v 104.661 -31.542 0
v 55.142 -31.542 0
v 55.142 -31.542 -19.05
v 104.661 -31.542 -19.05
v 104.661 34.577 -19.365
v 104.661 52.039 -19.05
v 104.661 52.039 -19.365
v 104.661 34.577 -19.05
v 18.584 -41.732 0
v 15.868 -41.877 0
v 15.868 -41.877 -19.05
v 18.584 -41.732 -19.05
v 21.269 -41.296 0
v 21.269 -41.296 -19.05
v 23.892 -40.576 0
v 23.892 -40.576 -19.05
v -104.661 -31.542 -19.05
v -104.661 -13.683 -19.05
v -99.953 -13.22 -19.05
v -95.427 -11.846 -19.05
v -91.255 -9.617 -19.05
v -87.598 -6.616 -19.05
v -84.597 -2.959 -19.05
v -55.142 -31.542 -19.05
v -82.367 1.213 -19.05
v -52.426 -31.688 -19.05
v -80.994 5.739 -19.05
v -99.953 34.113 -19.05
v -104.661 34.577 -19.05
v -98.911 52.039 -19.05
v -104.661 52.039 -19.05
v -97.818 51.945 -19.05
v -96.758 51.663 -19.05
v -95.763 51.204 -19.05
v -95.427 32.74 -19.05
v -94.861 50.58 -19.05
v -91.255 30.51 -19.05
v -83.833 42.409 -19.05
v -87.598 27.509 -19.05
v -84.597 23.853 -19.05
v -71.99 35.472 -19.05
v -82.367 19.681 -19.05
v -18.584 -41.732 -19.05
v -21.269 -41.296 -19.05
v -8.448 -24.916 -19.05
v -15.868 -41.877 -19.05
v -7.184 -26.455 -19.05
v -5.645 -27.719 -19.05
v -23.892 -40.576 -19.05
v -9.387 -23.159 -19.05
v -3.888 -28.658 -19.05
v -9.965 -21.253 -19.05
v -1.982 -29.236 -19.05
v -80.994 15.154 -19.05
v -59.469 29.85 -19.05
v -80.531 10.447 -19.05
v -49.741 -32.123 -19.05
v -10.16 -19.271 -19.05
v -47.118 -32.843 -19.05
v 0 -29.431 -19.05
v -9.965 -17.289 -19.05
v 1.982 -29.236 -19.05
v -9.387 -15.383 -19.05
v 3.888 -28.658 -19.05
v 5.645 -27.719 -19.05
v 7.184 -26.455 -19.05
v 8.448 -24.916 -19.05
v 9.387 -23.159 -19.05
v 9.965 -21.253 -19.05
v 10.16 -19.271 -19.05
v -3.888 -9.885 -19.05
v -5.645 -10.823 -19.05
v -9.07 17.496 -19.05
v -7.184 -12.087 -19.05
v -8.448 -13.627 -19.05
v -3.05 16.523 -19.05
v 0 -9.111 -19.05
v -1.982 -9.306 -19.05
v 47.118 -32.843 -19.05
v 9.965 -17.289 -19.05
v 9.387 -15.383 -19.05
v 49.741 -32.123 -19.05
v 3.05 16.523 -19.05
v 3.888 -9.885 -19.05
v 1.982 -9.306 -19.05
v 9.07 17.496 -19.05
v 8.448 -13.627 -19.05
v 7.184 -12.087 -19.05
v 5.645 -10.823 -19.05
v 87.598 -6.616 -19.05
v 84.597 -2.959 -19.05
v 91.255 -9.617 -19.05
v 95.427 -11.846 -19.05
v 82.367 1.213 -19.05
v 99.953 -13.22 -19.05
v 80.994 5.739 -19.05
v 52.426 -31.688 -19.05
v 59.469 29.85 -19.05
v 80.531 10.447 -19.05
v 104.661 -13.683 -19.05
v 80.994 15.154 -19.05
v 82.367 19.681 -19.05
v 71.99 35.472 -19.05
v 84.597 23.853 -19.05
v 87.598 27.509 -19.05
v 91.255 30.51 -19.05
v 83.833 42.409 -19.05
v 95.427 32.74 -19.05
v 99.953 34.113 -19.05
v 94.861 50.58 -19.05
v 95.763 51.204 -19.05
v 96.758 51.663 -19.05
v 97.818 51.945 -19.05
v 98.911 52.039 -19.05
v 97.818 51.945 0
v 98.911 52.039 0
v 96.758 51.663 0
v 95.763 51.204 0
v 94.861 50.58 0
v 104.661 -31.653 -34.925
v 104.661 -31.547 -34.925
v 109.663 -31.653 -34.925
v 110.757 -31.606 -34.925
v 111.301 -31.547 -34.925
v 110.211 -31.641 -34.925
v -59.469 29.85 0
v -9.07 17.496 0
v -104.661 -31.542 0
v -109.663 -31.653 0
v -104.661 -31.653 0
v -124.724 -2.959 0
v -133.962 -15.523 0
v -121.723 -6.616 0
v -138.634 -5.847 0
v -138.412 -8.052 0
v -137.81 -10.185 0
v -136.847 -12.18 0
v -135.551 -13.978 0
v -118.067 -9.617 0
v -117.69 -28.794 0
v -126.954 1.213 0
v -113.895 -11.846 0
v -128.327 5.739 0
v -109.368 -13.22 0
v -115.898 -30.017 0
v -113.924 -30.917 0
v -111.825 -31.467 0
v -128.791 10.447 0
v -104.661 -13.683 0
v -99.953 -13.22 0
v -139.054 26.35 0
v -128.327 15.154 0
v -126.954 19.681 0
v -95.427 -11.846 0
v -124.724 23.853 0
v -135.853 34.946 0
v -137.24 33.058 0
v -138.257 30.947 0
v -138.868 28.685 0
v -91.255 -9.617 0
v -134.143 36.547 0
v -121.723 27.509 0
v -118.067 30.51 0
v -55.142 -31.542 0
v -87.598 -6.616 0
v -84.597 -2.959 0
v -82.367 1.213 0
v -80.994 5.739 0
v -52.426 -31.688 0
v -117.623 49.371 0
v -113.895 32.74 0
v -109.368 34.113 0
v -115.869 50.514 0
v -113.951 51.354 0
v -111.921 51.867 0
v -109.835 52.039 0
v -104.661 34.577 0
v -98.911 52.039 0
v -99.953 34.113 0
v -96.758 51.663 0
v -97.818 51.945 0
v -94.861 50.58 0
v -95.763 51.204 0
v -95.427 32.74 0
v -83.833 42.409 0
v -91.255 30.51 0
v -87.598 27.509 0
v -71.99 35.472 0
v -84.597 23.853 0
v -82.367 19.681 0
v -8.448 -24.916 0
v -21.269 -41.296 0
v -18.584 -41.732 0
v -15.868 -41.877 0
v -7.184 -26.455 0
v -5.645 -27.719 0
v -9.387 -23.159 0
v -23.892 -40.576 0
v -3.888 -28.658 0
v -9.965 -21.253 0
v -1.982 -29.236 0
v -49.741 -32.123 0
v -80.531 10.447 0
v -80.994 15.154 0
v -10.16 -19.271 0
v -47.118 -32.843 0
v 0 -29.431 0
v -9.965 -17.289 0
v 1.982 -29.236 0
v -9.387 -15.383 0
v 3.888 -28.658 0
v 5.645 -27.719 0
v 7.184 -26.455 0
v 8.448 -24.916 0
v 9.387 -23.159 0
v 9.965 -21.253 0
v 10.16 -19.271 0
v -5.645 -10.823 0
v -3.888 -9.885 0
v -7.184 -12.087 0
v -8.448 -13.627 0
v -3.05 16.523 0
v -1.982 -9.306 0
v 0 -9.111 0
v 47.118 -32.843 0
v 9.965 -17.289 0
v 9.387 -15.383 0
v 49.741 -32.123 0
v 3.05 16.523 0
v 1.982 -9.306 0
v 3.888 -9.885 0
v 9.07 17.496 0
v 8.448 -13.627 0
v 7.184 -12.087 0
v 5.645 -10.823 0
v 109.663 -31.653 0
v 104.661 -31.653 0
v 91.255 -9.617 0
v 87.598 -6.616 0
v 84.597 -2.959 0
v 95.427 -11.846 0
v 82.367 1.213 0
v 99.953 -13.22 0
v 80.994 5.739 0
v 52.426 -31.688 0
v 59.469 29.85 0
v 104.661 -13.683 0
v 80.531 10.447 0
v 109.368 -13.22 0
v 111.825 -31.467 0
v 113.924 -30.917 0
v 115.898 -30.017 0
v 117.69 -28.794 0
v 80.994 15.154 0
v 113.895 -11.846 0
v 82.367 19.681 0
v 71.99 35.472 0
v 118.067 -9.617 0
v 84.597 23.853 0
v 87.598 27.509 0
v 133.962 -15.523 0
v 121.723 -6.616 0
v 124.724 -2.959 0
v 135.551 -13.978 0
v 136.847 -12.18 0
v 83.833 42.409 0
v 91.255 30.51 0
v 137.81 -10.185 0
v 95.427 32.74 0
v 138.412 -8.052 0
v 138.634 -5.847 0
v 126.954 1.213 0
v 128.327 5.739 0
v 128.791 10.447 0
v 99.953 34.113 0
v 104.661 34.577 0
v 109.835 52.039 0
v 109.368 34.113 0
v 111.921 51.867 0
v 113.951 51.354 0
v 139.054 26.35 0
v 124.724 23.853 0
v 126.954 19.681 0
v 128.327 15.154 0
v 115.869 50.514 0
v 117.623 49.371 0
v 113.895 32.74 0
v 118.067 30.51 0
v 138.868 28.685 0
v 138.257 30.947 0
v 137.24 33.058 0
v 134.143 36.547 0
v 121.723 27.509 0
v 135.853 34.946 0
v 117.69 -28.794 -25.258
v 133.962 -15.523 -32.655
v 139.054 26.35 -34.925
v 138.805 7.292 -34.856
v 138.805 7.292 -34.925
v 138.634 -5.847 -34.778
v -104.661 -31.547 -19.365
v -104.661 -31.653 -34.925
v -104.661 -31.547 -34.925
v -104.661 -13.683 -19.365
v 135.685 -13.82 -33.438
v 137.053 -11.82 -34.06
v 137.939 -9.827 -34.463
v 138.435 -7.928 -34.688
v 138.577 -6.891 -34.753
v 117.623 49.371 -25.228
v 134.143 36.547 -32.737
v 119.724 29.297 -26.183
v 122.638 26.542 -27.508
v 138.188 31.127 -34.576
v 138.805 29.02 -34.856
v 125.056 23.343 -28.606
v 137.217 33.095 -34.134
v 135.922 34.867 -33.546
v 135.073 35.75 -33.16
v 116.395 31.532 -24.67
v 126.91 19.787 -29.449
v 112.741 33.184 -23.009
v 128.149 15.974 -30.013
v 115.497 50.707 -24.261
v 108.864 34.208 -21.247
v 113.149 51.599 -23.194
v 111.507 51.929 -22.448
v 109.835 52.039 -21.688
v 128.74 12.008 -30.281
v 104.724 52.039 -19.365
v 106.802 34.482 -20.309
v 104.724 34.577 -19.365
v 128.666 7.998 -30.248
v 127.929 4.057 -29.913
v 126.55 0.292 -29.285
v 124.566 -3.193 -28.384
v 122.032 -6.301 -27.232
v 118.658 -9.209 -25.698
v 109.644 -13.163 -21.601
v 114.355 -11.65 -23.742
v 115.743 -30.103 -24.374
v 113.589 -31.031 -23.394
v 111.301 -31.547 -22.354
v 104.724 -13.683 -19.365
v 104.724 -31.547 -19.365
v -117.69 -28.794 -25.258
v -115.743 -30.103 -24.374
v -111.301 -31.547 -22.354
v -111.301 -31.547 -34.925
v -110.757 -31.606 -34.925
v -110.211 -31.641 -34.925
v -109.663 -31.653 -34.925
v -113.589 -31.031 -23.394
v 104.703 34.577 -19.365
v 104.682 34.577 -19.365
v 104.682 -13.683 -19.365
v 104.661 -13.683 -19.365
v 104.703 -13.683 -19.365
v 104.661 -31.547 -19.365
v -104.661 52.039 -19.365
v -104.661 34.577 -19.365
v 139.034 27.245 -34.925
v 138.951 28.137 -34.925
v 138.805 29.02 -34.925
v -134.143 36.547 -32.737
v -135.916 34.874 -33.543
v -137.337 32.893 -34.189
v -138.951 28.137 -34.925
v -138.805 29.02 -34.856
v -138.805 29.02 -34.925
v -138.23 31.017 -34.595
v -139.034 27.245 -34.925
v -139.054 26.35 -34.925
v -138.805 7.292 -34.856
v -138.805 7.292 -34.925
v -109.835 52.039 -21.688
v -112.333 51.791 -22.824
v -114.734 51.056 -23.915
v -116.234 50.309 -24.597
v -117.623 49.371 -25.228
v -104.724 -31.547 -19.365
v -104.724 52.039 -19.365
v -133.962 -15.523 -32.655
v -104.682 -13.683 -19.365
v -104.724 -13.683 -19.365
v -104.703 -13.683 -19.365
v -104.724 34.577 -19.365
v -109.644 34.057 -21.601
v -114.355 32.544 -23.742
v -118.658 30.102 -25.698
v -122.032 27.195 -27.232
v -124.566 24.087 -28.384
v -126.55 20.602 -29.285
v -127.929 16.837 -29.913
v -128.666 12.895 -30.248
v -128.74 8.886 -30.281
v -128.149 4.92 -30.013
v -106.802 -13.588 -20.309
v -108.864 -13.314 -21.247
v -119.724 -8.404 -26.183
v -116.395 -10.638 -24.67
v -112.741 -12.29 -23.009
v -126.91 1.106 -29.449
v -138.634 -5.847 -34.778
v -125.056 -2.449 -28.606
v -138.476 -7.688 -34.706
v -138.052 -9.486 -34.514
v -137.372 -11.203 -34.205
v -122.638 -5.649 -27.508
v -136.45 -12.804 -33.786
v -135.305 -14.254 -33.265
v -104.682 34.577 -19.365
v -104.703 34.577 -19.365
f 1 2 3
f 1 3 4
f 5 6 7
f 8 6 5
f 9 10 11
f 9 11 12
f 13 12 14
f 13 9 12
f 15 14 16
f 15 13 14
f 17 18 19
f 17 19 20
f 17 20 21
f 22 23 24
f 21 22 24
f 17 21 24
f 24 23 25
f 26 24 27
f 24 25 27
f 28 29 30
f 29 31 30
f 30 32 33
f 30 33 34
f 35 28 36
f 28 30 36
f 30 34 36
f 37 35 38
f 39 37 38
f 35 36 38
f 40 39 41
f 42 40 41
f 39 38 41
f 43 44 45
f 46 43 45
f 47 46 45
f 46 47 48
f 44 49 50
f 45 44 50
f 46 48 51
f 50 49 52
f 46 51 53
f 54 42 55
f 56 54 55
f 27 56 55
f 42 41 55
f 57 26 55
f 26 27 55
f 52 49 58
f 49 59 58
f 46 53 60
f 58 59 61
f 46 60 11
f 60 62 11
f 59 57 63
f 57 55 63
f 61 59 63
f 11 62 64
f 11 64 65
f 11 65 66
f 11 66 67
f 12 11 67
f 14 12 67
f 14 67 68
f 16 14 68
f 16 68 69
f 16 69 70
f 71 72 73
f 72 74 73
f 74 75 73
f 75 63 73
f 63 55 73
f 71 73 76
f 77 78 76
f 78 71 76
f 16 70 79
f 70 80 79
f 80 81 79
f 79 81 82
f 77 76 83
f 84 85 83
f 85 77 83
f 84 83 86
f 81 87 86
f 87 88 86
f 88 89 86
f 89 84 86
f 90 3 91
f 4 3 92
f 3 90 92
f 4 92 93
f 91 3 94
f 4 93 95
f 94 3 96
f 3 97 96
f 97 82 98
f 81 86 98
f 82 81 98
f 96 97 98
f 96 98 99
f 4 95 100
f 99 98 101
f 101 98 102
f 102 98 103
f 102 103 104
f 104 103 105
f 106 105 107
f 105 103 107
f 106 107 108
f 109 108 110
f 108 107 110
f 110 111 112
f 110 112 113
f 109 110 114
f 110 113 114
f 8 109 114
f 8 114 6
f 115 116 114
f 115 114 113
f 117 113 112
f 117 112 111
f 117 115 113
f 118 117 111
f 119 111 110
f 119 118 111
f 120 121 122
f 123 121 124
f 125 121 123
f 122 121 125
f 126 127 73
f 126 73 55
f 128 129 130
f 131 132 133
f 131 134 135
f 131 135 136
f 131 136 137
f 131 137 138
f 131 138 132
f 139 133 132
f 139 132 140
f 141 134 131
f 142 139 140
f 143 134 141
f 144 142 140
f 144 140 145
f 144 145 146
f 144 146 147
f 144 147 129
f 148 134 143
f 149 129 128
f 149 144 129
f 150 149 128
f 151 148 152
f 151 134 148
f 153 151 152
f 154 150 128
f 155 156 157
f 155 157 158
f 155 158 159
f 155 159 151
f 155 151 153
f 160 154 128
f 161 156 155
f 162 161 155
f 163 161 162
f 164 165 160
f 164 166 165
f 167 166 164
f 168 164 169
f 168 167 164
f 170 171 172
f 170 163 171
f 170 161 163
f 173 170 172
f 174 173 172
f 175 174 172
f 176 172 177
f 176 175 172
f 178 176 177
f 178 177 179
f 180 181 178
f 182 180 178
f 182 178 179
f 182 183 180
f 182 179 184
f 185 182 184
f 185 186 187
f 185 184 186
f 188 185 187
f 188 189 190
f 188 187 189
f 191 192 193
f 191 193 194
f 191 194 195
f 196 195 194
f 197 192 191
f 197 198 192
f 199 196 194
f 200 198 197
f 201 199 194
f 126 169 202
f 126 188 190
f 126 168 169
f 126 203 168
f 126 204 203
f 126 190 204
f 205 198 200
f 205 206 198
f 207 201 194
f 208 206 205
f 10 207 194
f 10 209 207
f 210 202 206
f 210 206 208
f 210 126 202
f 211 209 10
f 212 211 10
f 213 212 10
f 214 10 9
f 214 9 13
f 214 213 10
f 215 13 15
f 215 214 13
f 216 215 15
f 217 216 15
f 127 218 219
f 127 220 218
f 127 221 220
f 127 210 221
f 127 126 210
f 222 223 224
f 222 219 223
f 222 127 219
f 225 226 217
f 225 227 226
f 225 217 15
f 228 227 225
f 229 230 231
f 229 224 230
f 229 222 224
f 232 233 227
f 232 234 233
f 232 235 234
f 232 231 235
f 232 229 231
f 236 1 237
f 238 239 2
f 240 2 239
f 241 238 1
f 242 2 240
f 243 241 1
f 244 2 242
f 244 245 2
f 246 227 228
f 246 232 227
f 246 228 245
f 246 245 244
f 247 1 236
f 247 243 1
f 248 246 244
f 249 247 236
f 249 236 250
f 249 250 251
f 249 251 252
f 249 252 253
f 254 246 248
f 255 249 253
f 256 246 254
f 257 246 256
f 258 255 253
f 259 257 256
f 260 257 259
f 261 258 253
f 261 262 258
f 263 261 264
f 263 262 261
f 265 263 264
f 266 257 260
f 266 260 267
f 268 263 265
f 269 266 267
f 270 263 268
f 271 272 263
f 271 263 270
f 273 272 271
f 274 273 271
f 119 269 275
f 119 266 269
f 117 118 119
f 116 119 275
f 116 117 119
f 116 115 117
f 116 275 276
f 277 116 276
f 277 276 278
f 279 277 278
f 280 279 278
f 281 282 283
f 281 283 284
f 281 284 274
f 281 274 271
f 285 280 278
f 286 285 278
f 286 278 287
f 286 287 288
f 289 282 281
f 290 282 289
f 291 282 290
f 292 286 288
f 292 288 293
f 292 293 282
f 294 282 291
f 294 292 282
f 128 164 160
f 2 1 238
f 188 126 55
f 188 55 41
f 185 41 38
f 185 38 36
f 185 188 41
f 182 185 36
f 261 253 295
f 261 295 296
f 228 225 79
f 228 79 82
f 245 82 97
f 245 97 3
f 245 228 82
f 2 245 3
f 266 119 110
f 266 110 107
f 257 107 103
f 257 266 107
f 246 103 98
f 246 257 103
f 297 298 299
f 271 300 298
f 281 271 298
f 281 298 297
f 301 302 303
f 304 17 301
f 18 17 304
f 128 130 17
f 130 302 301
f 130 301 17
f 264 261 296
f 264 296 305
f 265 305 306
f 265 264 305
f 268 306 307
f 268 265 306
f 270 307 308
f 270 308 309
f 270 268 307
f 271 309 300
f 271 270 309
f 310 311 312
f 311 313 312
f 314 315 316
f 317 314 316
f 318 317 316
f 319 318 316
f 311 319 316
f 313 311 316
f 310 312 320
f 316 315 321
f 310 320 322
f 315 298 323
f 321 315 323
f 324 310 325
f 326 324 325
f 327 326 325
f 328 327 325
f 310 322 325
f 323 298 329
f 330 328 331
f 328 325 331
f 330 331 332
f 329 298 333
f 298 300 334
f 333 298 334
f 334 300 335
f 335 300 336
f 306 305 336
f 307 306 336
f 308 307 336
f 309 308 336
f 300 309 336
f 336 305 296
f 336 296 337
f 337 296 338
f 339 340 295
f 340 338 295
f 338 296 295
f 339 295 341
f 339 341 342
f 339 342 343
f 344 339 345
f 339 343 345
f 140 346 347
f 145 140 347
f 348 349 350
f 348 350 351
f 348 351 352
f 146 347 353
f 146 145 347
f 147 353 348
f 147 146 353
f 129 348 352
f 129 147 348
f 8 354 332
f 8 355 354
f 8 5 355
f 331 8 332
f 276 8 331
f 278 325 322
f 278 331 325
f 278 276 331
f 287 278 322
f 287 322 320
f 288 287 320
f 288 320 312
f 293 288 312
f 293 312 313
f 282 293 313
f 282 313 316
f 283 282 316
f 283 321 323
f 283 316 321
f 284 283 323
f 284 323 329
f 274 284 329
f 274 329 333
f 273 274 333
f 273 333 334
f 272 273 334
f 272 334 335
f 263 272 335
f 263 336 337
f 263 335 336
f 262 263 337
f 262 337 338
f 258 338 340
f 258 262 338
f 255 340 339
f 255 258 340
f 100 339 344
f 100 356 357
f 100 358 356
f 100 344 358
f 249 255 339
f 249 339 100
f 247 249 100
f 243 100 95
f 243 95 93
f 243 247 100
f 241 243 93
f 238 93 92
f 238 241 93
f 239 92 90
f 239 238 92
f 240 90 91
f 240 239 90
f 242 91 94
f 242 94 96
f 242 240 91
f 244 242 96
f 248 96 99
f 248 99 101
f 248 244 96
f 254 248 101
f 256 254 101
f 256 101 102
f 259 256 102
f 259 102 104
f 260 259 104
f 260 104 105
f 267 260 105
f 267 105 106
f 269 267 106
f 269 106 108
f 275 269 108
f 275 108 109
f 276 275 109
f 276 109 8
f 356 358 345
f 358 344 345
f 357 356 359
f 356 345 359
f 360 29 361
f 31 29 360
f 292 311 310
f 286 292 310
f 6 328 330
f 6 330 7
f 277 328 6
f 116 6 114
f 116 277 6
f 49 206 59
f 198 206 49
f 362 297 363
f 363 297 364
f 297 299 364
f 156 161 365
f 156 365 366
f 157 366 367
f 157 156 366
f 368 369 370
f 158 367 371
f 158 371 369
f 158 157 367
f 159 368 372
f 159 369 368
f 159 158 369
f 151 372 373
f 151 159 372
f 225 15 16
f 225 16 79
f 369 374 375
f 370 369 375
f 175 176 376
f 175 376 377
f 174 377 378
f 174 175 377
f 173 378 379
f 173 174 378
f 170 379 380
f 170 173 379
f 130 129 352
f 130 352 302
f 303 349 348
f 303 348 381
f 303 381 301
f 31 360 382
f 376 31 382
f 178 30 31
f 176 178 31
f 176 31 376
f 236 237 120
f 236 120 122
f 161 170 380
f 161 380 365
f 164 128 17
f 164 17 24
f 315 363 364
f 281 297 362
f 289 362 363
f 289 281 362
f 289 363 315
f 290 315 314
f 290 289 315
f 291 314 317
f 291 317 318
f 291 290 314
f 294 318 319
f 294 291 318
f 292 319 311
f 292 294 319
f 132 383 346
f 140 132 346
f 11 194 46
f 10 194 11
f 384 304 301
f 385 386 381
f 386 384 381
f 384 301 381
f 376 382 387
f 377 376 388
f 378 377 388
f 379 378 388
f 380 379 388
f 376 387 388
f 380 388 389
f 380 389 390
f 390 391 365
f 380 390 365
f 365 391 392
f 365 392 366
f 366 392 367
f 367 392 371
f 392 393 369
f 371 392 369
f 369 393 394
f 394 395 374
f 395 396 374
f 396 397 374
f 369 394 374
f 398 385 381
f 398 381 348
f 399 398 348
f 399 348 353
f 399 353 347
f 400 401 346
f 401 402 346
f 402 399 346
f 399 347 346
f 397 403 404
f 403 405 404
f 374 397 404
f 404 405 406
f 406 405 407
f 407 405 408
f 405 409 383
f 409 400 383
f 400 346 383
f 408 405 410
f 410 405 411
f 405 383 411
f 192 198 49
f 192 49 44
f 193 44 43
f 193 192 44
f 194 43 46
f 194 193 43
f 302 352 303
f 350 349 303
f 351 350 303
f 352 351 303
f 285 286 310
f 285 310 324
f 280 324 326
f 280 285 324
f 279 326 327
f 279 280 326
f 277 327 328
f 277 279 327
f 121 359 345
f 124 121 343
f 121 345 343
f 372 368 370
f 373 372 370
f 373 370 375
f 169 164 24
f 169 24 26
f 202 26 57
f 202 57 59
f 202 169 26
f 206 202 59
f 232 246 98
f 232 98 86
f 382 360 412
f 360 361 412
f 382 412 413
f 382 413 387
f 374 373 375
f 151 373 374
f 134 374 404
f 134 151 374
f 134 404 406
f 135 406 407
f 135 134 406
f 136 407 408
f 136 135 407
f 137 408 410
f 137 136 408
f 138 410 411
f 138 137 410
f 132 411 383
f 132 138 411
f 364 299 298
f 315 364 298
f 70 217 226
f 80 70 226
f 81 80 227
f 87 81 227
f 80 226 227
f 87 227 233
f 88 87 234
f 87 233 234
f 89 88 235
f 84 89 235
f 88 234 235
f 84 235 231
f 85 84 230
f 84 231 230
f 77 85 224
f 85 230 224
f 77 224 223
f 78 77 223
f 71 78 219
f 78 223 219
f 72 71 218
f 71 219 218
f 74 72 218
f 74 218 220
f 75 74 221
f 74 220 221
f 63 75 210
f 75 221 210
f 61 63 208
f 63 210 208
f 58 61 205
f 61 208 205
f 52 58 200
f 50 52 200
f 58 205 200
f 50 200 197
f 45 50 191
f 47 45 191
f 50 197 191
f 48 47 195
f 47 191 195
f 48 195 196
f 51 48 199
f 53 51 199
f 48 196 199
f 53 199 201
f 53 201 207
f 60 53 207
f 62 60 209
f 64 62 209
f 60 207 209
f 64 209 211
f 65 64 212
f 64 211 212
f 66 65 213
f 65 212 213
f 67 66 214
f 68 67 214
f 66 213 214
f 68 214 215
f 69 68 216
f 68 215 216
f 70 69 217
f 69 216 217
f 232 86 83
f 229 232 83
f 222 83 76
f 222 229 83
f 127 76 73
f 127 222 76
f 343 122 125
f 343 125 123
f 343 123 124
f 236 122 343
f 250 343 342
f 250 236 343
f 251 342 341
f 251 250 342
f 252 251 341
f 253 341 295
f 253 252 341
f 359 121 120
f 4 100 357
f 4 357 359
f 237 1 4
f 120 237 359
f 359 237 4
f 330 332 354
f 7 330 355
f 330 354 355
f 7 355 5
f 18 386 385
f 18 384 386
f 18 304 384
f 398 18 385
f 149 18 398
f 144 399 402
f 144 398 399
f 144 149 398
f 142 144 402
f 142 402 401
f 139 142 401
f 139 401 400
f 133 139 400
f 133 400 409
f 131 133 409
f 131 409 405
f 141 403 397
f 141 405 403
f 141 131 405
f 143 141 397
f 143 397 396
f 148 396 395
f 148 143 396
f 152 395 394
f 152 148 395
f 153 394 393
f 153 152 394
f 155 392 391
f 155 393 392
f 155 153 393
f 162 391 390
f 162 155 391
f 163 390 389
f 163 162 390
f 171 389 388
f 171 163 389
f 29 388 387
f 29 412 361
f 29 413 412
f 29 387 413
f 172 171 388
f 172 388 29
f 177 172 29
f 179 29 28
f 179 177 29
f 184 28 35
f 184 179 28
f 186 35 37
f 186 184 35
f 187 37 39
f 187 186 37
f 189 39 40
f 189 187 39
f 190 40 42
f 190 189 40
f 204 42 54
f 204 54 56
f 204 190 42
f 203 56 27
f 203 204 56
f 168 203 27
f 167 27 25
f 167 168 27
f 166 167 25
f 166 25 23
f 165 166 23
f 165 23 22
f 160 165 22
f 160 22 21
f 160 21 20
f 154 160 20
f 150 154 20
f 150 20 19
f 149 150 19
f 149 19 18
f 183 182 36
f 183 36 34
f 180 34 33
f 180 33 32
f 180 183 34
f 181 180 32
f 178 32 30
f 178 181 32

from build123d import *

# Parameters (mm, degrees)
F0_R     = 10.16
F2_DEPTH = 19.05
F3_DEPTH = 34.925
F6_DEPTH = 101.6
F7_DEPTH = 101.6


with BuildPart() as f2:
    # F0 (on Top) → F2 (new body)
    with BuildSketch(Plane.XY):
        with BuildLine():
            ThreePointArc((-104.6607, 34.576826), (-80.5307, 10.446826), (-104.6607, -13.683174))
            Line((-104.6607, -13.683174), (-104.6607, -20.42969))
            Line((-104.6607, -20.42969), (-104.6607, -31.54219))
            Line((-104.6607, -31.54219), (-55.142368, -31.54219))
            ThreePointArc((-55.142368, -31.54219), (-51.077865, -31.8695), (-47.118115, -32.842992))
            Line((-47.118115, -32.842992), (-23.892494, -40.576372))
            ThreePointArc((-23.892494, -40.576372), (-19.932744, -41.549864), (-15.868241, -41.877174))
            Line((-15.868241, -41.877174), (15.868241, -41.877174))
            ThreePointArc((15.868241, -41.877174), (19.932744, -41.549864), (23.892494, -40.576372))
            Line((23.892494, -40.576372), (47.118115, -32.842992))
            ThreePointArc((47.118115, -32.842992), (51.077865, -31.8695), (55.142368, -31.54219))
            Line((55.142368, -31.54219), (104.6607, -31.54219))
            Line((104.6607, -31.54219), (104.6607, -20.42969))
            Line((104.6607, -20.42969), (104.6607, -13.683174))
            ThreePointArc((104.6607, -13.683174), (80.5307, 10.446826), (104.6607, 34.576826))
            Line((104.6607, 34.576826), (104.6607, 40.926826))
            Line((104.6607, 40.926826), (104.6607, 52.039326))
            Line((104.6607, 52.039326), (98.910701, 52.039326))
            ThreePointArc((98.910701, 52.039326), (96.758253, 51.663393), (94.860664, 50.580103))
            ThreePointArc((94.860664, 50.580103), (78.004883, 38.780339), (59.468634, 29.849533))
            Line((59.468634, 29.849533), (9.070406, 17.496127))
            ThreePointArc((9.070406, 17.496127), (0, 16.400691), (-9.070406, 17.496127))
            Line((-9.070406, 17.496127), (-59.468634, 29.849533))
            ThreePointArc((-59.468634, 29.849533), (-78.004883, 38.780339), (-94.860664, 50.580103))
            ThreePointArc((-94.860664, 50.580103), (-96.758253, 51.663393), (-98.910701, 52.039326))
            Line((-98.910701, 52.039326), (-104.6607, 52.039326))
            Line((-104.6607, 52.039326), (-104.6607, 40.926826))
            Line((-104.6607, 40.926826), (-104.6607, 34.576826))
        make_face()
        with Locations((0, -19.271174)):
            Circle(F0_R, mode=Mode.SUBTRACT)
    extrude(amount=-F2_DEPTH)

    # F1 (on Top) → F3 (join)
    with BuildSketch(Plane.XY):
        with BuildLine():
            ThreePointArc((-104.6607, -13.683174), (-128.7907, 10.446826), (-104.6607, 34.576826))
            Line((-104.6607, 34.576826), (-104.6607, 52.039326))
            Line((-104.6607, 52.039326), (-109.834866, 52.039326))
            ThreePointArc((-109.834866, 52.039326), (-113.950863, 51.353842), (-117.622536, 49.371385))
            Line((-117.622536, 49.371385), (-134.142671, 36.547162))
            ThreePointArc((-134.142671, 36.547162), (-137.797157, 32.025737), (-139.053922, 26.349551))
            Line((-139.053922, 26.349551), (-138.634187, -5.846879))
            ThreePointArc((-138.634187, -5.846879), (-137.371916, -11.203376), (-133.962188, -15.522999))
            Line((-133.962188, -15.522999), (-117.690247, -28.794484))
            ThreePointArc((-117.690247, -28.794484), (-113.92365, -30.916909), (-109.663324, -31.652812))
            Line((-109.663324, -31.652812), (-104.6607, -31.652812))
            Line((-104.6607, -31.652812), (-104.6607, -13.683174))
        make_face()
        with BuildLine():
            ThreePointArc((117.622536, 49.371385), (113.950863, 51.353842), (109.834866, 52.039326))
            Line((109.834866, 52.039326), (104.6607, 52.039326))
            Line((104.6607, 52.039326), (104.6607, 34.576826))
            ThreePointArc((104.6607, 34.576826), (128.7907, 10.446826), (104.6607, -13.683174))
            Line((104.6607, -13.683174), (104.6607, -31.652812))
            Line((104.6607, -31.652812), (109.663324, -31.652812))
            ThreePointArc((109.663324, -31.652812), (113.92365, -30.916909), (117.690247, -28.794484))
            Line((117.690247, -28.794484), (133.962188, -15.522999))
            ThreePointArc((133.962188, -15.522999), (137.371916, -11.203376), (138.634187, -5.846879))
            Line((138.634187, -5.846879), (139.053922, 26.349551))
            ThreePointArc((139.053922, 26.349551), (137.797157, 32.025737), (134.142671, 36.547162))
            Line((134.142671, 36.547162), (117.622536, 49.371385))
        make_face()
    extrude(amount=-F3_DEPTH)

    # F5 (on offset) → F6 (cut)
    with BuildSketch(Plane.XZ.offset(31.5468)):
        Polygon((-104.723774, -19.364603), (-138.805479, -34.856286), (-138.805479, -39.619088), (-104.723774, -39.619088), (-104.723774, -38.741853), (-97.308874, -38.741853), (-97.308874, -19.364603), align=None)
        Polygon((104.723774, -19.364603), (97.308874, -19.364603), (97.308874, -38.741853), (104.723774, -38.741853), (104.723774, -39.619088), (138.805479, -39.619088), (138.805479, -34.856286), align=None)
    extrude(amount=-F6_DEPTH, mode=Mode.SUBTRACT)

    # F5 (on offset) → F7 (cut)
    with BuildSketch(Plane.XZ.offset(31.5468)):
        Polygon((-104.723774, -19.364603), (-138.805479, -34.856286), (-138.805479, -39.619088), (-104.723774, -39.619088), (-104.723774, -38.741853), (-97.308874, -38.741853), (-97.308874, -19.364603), align=None)
        Polygon((104.723774, -19.364603), (97.308874, -19.364603), (97.308874, -38.741853), (104.723774, -38.741853), (104.723774, -39.619088), (138.805479, -39.619088), (138.805479, -34.856286), align=None)
    extrude(amount=-F7_DEPTH, mode=Mode.SUBTRACT)


solid = f2.part
